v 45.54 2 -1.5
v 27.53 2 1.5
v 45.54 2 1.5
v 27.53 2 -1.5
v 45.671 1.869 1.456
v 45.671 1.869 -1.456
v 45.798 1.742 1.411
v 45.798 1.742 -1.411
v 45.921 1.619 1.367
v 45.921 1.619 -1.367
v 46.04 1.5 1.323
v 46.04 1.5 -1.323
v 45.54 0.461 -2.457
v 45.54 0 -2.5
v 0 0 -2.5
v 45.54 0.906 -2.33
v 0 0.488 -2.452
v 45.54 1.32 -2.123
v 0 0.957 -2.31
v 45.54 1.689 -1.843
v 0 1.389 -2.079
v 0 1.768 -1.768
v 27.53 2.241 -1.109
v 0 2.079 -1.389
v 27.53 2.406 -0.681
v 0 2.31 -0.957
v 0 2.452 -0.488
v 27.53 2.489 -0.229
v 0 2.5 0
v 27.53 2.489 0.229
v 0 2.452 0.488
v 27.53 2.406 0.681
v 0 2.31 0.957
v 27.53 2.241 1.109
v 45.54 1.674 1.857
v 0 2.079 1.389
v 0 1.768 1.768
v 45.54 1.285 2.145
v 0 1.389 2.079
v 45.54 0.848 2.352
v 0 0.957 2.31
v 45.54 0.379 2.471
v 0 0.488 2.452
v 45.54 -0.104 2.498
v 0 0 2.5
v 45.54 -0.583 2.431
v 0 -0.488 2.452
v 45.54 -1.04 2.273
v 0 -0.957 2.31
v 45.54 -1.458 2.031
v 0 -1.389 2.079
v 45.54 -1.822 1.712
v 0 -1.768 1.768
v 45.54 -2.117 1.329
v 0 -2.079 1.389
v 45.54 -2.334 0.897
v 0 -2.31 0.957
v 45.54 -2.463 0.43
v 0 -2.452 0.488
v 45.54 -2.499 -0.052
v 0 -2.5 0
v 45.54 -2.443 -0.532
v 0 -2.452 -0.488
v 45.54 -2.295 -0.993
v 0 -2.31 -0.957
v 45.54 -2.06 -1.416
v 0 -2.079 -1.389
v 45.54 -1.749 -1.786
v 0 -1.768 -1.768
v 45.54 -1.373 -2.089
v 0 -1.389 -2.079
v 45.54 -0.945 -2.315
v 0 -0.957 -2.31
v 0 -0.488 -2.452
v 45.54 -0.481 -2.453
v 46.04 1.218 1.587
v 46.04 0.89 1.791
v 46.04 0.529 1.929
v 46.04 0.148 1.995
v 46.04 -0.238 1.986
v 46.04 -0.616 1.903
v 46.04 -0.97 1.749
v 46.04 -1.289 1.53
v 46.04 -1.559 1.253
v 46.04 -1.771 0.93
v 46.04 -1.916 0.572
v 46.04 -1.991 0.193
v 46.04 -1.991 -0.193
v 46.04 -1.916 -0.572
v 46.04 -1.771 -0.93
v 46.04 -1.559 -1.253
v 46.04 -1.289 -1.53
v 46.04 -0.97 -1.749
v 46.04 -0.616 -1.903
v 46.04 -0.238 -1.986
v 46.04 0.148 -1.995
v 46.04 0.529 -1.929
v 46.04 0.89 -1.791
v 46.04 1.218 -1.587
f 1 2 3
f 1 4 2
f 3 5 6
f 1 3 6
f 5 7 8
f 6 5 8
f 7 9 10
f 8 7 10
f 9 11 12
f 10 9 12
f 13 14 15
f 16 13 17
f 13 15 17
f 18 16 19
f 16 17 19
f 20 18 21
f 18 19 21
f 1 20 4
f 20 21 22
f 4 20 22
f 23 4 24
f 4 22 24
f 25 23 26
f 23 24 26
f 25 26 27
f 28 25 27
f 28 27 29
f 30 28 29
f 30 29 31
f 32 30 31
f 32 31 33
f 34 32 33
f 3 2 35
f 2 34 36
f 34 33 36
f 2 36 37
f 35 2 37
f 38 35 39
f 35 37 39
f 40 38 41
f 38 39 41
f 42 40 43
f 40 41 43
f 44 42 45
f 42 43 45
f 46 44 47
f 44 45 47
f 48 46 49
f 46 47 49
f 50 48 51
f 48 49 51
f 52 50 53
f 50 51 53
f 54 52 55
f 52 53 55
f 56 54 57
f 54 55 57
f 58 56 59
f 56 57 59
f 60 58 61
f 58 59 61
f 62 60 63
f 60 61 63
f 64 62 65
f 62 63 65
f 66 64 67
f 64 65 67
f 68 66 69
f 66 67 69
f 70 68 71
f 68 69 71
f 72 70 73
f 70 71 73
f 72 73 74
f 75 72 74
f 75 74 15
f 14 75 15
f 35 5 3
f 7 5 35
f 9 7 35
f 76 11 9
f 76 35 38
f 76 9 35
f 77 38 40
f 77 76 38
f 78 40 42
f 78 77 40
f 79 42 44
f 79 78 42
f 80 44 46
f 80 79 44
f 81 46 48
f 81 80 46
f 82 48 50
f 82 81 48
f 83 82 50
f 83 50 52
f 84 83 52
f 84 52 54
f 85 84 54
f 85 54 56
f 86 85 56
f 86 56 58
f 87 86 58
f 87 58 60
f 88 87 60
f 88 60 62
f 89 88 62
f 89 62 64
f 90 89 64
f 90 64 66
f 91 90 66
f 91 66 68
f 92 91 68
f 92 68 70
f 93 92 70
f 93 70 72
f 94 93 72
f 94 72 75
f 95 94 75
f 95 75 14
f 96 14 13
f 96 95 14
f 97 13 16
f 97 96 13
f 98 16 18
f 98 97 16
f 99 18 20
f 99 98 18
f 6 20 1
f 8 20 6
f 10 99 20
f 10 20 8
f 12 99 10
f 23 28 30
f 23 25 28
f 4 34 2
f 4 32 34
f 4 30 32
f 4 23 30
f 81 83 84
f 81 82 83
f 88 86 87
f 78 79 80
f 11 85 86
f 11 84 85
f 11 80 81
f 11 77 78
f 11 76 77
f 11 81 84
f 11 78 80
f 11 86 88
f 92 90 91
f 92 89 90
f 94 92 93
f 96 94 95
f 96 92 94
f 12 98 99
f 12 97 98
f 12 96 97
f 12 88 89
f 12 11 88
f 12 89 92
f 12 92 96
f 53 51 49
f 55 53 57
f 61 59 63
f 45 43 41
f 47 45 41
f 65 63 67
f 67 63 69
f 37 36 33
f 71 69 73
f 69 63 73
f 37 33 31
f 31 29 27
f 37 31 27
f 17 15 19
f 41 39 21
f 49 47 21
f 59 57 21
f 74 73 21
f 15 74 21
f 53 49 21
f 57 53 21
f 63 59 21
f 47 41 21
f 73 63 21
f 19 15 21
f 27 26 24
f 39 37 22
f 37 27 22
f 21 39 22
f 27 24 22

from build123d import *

# Parameters (mm, degrees)
SKETCH1_R           = 2.5
BOSS_EXTRUDE1_DEPTH = 46.04
SKETCH3_W           = 18.51
SKETCH3_H           = 3
CUT_EXTRUDE1_DEPTH  = 0.5
CHAMFER1_SIZE       = 0.5


with BuildPart() as part:
    # Sketch1 → Boss-Extrude1 (new body)
    with BuildSketch(Plane(origin=(0, 0, 0), x_dir=(0, 0, -1), z_dir=(1, 0, 0))):
        Circle(SKETCH1_R)
    extrude(amount=BOSS_EXTRUDE1_DEPTH)

    # Sketch3 → Cut-Extrude1 (cut)
    with BuildSketch(Plane(origin=(0, 2.5, 0), x_dir=(1, 0, 0), z_dir=(0, 1, 0))):
        with Locations((36.785, 0)):
            Rectangle(SKETCH3_W, SKETCH3_H)
    extrude(amount=-CUT_EXTRUDE1_DEPTH, mode=Mode.SUBTRACT)

    # Chamfer1
    chamfer1_edges = [part.edges().sort_by_distance(p)[0] for p in [
        (46.04, -2.236067977, 1.118033989),
        (46.04, 2, 0),
    ]]
    chamfer(chamfer1_edges, length=CHAMFER1_SIZE - 0.0001)  # a hair under: the kernel refuses the full size


solid = part.part
